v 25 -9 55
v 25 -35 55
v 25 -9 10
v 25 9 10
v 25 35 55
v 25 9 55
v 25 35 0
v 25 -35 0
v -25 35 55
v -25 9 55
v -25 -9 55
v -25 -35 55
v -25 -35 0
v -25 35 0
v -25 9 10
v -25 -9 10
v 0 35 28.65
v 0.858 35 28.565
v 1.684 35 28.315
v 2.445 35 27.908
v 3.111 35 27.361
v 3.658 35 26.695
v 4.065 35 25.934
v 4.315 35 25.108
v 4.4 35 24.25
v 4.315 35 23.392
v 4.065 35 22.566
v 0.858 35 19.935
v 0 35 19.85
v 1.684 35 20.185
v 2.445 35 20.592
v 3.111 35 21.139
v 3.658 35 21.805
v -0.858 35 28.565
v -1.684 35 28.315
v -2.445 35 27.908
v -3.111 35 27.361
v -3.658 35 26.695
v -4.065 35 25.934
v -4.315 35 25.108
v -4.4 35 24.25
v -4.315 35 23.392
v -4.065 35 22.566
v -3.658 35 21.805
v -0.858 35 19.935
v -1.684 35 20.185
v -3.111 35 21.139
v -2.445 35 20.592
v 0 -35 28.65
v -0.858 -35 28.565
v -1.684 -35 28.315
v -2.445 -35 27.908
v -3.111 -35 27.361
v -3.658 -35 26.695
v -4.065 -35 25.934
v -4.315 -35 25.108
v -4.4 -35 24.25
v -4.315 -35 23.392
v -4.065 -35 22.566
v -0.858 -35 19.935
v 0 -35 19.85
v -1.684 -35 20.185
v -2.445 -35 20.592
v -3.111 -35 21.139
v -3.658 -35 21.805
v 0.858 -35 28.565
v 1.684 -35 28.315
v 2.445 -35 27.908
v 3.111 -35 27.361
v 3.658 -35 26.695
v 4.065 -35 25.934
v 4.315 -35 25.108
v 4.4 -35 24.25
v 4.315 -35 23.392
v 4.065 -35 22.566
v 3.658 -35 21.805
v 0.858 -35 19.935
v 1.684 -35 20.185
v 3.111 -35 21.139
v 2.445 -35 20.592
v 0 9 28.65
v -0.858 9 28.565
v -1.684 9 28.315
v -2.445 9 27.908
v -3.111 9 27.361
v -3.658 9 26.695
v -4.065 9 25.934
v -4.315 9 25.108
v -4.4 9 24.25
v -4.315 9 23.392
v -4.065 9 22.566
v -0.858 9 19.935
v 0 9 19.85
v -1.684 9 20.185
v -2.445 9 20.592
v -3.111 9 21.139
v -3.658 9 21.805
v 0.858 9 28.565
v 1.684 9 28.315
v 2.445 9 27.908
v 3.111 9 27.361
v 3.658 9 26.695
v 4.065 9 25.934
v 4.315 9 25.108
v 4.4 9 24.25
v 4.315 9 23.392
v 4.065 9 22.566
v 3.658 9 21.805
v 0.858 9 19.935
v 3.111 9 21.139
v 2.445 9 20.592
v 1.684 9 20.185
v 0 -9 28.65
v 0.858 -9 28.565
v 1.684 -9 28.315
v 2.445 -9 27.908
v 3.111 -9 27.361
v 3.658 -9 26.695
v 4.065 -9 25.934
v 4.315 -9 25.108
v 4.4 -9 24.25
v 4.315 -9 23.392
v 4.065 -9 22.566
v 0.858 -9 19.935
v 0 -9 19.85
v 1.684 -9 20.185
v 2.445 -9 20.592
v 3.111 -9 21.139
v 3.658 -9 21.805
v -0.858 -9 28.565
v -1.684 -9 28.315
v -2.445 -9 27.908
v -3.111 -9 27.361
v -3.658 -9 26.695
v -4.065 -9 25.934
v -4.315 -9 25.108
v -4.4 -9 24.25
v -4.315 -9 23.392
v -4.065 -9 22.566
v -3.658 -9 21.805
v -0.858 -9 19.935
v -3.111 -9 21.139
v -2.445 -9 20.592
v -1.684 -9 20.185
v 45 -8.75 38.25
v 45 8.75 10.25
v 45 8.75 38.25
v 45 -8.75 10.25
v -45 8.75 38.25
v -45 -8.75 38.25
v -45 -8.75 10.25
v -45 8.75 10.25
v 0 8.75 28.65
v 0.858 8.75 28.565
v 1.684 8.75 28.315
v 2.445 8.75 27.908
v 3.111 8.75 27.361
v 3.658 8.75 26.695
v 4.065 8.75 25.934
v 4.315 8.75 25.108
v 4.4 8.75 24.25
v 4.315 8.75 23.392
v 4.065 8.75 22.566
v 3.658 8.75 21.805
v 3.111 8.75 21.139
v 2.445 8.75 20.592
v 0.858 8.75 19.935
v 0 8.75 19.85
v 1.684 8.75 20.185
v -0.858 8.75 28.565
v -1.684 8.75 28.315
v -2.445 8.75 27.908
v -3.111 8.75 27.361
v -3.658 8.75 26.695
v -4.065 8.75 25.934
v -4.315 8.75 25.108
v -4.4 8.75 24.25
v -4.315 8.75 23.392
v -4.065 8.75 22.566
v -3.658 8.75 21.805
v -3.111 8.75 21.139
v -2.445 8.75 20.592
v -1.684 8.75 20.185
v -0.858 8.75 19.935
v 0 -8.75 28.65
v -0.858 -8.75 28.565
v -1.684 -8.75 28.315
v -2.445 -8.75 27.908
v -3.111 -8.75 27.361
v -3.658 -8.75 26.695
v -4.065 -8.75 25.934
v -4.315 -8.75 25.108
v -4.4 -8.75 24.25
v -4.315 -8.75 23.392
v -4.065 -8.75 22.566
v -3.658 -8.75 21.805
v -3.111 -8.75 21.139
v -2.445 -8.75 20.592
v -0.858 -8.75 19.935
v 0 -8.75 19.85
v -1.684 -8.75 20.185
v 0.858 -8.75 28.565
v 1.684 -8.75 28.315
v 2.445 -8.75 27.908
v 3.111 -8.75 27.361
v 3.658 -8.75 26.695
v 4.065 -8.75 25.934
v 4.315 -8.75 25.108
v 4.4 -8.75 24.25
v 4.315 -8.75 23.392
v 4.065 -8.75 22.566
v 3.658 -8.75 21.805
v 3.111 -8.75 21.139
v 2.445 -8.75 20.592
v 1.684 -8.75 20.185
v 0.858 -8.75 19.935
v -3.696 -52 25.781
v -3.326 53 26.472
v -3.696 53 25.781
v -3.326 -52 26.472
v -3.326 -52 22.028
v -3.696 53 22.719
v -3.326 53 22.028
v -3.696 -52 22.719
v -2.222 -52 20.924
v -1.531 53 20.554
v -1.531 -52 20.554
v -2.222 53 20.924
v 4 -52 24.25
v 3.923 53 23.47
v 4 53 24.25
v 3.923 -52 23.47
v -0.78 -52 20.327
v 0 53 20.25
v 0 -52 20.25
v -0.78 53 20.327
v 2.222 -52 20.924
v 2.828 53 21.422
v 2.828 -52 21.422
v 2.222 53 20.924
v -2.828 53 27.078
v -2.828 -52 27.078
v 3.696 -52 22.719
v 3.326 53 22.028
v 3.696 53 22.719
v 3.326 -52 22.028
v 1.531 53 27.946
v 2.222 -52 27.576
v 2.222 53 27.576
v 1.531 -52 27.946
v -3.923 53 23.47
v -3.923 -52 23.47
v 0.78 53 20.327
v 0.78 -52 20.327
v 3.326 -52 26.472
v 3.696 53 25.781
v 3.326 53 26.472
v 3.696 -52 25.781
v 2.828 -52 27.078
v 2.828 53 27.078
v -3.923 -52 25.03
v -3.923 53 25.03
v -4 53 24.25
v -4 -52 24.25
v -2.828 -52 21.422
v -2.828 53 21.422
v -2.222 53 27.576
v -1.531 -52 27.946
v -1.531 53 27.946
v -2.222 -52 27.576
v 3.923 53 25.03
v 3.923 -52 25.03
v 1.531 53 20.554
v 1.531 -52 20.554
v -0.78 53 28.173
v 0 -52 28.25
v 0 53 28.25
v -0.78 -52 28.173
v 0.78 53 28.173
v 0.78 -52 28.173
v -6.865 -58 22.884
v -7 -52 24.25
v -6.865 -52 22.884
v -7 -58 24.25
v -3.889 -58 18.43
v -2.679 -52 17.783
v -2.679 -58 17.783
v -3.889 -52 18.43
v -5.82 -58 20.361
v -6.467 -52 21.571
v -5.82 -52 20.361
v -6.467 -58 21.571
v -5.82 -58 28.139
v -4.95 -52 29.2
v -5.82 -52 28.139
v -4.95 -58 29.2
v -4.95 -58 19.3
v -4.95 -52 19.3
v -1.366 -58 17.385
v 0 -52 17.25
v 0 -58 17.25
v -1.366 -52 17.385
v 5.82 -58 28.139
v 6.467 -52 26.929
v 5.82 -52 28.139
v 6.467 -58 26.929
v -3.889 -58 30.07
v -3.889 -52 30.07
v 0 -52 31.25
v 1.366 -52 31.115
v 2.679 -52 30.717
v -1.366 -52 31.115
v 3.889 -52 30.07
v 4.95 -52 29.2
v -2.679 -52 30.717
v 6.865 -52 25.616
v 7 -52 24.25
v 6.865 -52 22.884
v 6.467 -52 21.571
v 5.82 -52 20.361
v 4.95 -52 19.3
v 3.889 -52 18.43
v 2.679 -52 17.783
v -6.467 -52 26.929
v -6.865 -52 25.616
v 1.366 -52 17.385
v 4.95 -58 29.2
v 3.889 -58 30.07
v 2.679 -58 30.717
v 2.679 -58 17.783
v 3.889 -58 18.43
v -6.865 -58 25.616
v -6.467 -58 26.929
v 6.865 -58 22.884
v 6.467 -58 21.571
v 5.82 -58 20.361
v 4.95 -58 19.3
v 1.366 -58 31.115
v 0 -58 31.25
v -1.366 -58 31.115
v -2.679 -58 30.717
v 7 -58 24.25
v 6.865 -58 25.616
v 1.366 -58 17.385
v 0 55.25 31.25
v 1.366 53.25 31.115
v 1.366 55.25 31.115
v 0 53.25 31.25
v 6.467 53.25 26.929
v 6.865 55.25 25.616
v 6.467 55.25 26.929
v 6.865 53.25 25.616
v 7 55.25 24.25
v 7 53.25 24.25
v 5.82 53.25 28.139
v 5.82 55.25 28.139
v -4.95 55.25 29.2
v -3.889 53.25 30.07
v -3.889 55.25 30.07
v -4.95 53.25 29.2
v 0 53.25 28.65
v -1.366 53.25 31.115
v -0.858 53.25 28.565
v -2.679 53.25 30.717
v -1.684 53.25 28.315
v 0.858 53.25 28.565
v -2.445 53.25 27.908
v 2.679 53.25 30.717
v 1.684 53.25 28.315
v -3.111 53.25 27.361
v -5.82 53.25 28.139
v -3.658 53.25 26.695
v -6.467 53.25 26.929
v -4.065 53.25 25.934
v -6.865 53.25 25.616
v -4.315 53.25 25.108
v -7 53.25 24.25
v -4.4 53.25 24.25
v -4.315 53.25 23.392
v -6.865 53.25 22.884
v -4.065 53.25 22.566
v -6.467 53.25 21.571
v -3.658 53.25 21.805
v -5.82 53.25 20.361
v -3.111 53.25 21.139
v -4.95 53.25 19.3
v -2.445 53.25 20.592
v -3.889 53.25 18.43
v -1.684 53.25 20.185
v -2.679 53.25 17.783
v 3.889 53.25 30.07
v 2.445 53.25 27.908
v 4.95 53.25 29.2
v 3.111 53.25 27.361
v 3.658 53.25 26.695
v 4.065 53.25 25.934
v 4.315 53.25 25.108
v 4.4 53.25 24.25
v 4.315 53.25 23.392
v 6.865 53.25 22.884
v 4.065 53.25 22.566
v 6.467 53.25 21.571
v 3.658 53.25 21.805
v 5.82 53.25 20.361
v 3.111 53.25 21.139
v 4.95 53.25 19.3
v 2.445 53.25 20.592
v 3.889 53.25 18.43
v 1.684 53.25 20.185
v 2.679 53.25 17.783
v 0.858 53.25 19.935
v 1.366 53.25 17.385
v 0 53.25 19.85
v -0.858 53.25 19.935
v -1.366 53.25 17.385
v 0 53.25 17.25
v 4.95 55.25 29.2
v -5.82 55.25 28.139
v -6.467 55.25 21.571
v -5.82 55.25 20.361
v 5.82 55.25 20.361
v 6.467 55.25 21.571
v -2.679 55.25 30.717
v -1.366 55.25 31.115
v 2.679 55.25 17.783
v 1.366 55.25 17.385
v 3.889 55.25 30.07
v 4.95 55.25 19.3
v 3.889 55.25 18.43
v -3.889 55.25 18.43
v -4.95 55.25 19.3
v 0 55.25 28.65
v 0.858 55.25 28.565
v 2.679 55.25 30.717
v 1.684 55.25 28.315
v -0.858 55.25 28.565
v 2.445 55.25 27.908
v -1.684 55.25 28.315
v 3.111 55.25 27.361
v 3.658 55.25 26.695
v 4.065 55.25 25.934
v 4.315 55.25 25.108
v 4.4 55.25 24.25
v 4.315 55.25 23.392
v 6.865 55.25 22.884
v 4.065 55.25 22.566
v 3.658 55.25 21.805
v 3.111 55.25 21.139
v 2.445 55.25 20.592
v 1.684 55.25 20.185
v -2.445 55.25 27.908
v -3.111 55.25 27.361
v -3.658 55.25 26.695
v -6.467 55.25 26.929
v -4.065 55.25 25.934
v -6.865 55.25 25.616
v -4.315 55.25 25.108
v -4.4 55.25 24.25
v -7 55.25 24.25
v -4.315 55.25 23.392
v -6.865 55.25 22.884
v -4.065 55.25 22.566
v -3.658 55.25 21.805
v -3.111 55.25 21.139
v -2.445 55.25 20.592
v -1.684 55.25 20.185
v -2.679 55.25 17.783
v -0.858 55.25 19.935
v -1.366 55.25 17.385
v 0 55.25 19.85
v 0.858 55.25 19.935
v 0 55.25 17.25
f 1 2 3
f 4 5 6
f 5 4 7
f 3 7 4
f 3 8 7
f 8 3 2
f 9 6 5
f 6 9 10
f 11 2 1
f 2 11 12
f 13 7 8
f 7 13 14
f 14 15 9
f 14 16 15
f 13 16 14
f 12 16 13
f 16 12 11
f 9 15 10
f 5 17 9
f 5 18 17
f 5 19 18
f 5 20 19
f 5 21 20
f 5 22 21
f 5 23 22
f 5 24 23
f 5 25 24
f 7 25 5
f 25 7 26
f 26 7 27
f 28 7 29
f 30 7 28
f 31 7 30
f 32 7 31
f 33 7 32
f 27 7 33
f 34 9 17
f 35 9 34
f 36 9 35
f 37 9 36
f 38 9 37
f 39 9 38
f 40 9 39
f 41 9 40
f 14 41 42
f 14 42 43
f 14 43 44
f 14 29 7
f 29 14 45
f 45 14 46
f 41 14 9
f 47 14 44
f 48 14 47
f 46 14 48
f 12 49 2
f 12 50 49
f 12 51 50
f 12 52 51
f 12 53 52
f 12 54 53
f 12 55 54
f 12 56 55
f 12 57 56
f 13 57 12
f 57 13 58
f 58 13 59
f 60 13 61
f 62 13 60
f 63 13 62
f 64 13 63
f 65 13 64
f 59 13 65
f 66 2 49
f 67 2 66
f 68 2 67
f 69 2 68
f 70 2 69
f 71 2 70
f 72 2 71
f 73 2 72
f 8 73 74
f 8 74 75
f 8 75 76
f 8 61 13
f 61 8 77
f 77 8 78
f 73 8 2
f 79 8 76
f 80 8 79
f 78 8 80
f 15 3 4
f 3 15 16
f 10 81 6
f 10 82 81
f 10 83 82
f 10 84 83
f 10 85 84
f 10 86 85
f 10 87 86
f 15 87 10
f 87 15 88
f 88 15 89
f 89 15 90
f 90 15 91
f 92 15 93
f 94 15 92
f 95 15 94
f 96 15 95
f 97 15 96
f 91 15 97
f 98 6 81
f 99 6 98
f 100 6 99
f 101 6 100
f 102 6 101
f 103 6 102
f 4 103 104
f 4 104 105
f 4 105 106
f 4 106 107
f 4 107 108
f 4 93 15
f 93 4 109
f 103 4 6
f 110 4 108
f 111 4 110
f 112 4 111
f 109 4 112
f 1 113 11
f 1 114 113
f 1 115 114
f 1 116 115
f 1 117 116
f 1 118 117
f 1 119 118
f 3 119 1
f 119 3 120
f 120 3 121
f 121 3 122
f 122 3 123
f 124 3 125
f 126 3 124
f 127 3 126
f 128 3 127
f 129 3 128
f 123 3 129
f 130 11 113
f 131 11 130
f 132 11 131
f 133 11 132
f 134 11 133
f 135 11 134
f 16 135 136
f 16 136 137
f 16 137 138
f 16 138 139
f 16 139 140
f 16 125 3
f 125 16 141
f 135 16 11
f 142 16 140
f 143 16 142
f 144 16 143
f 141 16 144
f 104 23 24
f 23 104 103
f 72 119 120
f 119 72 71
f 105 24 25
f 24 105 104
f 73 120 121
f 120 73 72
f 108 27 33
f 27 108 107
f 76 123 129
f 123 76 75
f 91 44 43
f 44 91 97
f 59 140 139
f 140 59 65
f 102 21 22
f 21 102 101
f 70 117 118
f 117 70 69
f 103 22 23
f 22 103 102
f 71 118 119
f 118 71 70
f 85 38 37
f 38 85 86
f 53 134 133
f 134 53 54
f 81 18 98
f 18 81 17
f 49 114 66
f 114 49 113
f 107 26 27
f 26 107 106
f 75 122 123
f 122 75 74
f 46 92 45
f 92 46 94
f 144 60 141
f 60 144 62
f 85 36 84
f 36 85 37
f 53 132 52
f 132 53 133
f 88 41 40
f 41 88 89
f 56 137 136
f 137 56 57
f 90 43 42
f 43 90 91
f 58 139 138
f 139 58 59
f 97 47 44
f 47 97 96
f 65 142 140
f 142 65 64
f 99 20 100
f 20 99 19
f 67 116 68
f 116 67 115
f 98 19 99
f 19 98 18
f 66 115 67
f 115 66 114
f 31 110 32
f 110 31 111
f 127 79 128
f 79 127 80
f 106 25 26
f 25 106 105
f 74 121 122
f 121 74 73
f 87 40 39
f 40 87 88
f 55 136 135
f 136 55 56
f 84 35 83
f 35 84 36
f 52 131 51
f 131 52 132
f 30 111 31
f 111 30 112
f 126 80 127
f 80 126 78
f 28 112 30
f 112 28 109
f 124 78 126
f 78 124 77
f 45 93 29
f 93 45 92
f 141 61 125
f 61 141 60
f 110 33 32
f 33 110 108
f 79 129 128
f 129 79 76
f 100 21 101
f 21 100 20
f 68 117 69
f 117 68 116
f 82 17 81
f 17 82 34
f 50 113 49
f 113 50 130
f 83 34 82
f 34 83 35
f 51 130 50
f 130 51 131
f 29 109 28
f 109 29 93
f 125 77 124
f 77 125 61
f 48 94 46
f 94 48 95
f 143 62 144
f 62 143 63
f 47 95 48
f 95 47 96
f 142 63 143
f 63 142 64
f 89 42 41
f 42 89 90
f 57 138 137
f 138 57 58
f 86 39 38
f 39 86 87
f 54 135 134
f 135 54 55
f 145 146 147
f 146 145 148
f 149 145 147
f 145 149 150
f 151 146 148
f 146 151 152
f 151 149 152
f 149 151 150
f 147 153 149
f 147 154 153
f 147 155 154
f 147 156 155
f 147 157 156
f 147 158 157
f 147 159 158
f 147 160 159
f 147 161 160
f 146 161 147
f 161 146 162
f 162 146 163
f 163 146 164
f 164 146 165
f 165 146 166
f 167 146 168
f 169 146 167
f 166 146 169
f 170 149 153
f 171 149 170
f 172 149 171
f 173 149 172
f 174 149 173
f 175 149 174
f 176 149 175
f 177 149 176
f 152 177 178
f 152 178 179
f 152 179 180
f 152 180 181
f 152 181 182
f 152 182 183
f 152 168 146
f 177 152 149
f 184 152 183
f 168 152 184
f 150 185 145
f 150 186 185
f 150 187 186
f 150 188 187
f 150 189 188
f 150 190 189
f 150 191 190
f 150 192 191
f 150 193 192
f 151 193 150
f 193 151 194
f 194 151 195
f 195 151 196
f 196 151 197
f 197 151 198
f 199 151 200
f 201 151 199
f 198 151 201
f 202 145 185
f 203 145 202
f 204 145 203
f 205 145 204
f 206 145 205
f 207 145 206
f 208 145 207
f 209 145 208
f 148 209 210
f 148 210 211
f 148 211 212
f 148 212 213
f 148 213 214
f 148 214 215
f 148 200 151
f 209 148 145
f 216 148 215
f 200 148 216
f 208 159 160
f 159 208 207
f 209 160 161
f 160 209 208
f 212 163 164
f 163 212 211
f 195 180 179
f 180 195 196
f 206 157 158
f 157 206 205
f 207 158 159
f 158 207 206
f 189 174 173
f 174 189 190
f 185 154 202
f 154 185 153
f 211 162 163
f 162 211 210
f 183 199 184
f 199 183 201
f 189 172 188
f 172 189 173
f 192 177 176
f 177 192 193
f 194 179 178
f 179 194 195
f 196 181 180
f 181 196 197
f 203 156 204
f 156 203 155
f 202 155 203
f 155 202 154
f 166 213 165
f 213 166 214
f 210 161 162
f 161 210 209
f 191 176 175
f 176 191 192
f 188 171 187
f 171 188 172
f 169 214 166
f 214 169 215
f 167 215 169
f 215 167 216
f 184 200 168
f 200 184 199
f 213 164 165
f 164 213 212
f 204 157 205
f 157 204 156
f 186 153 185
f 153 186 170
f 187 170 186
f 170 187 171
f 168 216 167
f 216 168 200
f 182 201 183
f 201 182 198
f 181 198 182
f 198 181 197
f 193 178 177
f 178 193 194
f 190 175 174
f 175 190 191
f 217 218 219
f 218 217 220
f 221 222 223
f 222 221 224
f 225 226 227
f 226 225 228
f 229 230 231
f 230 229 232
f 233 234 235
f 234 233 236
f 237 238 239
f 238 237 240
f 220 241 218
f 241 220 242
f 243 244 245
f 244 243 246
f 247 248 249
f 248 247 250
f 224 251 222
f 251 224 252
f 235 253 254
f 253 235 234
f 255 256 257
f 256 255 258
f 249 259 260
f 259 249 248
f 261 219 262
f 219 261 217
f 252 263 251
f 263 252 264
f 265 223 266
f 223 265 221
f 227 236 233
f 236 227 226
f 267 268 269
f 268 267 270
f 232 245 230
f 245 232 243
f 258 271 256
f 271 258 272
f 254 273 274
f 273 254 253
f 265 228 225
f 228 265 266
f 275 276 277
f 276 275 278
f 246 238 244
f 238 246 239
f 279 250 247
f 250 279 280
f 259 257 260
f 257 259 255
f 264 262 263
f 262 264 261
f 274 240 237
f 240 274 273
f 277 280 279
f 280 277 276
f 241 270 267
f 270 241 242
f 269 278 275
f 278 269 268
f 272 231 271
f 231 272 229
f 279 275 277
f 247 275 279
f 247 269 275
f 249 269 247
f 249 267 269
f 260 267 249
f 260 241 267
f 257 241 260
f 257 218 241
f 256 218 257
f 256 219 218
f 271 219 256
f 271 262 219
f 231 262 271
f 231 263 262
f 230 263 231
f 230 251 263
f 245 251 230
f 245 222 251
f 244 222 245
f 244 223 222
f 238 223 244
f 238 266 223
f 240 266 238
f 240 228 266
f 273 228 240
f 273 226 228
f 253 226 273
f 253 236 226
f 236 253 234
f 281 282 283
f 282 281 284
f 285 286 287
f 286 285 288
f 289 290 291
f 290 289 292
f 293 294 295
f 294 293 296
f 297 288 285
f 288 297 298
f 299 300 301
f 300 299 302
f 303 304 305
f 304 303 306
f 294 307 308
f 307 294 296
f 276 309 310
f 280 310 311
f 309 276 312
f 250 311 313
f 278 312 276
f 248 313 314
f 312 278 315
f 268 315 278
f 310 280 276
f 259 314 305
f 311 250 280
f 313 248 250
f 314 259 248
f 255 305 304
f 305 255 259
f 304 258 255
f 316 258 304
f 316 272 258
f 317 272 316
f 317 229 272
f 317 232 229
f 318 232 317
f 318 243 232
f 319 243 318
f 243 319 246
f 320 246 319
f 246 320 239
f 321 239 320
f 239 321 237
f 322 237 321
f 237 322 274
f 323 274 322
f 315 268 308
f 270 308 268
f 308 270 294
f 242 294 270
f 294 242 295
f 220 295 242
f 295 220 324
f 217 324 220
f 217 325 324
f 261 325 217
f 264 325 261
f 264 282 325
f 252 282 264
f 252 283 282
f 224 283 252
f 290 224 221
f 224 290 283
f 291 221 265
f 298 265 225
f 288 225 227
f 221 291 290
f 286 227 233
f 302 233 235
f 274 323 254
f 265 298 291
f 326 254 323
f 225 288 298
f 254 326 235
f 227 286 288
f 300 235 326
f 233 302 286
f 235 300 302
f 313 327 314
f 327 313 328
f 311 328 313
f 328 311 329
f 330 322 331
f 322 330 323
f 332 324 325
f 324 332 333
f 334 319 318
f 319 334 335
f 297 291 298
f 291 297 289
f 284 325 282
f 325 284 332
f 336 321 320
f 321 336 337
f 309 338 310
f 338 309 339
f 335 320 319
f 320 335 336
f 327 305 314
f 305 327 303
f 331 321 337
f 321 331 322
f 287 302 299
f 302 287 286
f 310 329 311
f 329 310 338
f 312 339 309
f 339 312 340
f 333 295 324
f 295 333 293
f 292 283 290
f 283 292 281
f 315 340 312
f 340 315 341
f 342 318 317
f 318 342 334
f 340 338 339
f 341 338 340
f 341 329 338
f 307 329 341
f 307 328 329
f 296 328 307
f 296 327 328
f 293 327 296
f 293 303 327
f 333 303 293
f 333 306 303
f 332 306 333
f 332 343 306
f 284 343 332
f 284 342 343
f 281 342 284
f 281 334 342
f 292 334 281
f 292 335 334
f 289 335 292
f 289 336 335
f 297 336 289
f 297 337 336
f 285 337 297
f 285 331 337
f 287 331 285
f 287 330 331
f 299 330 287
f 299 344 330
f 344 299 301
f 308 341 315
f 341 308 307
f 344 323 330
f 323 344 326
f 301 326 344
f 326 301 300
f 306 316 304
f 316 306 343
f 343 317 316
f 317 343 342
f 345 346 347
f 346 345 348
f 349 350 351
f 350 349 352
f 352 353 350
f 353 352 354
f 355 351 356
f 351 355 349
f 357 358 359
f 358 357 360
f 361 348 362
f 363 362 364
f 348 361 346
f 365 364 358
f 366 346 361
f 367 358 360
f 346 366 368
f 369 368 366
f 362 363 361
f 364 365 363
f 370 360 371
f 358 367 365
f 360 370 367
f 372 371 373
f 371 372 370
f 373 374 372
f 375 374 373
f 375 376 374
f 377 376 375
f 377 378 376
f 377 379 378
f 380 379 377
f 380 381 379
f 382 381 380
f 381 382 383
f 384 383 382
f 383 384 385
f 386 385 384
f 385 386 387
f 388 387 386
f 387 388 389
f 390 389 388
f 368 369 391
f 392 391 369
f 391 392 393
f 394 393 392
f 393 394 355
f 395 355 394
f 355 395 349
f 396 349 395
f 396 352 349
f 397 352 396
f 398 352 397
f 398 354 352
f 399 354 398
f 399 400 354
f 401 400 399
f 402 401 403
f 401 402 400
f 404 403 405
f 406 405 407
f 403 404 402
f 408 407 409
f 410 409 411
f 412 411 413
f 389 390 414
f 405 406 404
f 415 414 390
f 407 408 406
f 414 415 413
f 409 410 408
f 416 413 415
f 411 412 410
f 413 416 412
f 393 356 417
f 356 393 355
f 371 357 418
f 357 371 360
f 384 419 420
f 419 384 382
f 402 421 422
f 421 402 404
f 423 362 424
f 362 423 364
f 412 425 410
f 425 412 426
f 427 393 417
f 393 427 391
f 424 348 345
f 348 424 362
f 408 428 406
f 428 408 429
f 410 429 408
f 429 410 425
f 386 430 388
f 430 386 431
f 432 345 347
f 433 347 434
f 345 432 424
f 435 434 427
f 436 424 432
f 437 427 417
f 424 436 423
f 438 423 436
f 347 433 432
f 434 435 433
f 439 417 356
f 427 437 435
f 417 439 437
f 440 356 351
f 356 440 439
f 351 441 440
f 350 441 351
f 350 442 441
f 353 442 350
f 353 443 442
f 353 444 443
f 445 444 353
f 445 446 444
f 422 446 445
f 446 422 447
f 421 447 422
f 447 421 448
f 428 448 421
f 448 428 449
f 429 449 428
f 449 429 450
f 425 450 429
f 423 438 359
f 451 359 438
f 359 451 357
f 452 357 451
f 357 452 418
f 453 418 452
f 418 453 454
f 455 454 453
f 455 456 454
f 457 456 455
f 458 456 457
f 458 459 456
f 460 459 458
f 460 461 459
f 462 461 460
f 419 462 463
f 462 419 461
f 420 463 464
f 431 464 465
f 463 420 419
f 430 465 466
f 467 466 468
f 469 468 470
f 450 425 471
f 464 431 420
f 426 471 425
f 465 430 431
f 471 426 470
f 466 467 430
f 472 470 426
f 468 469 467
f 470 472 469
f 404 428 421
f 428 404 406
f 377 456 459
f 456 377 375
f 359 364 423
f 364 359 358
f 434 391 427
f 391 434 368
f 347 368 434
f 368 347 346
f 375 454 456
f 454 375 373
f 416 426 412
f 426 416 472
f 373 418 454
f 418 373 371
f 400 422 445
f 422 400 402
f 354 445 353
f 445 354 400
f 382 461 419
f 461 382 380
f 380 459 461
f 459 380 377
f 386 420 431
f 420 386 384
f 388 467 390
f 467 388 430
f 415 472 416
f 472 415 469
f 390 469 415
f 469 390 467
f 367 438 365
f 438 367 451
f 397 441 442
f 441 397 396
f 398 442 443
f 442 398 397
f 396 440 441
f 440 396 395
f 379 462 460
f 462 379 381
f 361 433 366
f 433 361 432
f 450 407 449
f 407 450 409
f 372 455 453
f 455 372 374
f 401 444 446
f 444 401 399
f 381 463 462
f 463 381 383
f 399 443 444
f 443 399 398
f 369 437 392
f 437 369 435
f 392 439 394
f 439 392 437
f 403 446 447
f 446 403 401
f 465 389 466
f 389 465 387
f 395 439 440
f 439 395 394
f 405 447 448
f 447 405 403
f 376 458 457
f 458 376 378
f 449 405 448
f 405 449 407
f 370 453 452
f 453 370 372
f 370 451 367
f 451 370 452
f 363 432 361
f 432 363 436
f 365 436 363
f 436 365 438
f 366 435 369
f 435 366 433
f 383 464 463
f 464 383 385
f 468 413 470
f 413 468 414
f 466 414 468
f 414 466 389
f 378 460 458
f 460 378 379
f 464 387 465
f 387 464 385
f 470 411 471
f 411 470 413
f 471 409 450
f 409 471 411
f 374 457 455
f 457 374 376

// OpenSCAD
$fn = 32;

// ------------------------------------------------------------------------
// Clevis joint: 50 mm clevis, pin d8
// Every part is its own module, assembly() places them once.
// ------------------------------------------------------------------------

// --- part 1 ---
module clevis() {
  difference() {
    translate([-25, -35, 0]) cube([50, 70, 55]);
    translate([-26, -9, 10]) cube([52, 18, 46]);
    translate([0, 0, 24.25]) rotate([90, 0, 0]) cylinder(h = 72, d = 8.8, center = true);
  }
}

// --- part 2 ---
module eye() {
  difference() {
    translate([-45, -8.75, 0]) cube([90, 17.5, 28]);
    translate([0, 0, 14]) rotate([90, 0, 0]) cylinder(h = 19.5, d = 8.8, center = true);
  }
}

// --- part 3 ---
module pin() {
  rotate([0, 90, 0]) cylinder(h = 106, d = 8, center = true);
  translate([-58, 0, 0]) rotate([0, 90, 0]) cylinder(h = 6, d = 14);
}

// --- part 4 ---
module retainer() {
  difference() {
      translate([0, 0, 0]) cylinder(h = 2, d = 14);
      translate([0, 0, -1]) cylinder(h = 4, d = 8.8);
    }
}

// --- assembly ---
module assembly() {
  translate([0, 0, 0]) rotate([0, 0, 0]) clevis();
  translate([0, 0, 10.25]) rotate([0, 0, 0]) eye();
  translate([0, 0, 24.25]) rotate([0, 0, 90]) pin();
  translate([0, 55.25, 24.25]) rotate([90, 0, 0]) retainer();
}

assembly();
